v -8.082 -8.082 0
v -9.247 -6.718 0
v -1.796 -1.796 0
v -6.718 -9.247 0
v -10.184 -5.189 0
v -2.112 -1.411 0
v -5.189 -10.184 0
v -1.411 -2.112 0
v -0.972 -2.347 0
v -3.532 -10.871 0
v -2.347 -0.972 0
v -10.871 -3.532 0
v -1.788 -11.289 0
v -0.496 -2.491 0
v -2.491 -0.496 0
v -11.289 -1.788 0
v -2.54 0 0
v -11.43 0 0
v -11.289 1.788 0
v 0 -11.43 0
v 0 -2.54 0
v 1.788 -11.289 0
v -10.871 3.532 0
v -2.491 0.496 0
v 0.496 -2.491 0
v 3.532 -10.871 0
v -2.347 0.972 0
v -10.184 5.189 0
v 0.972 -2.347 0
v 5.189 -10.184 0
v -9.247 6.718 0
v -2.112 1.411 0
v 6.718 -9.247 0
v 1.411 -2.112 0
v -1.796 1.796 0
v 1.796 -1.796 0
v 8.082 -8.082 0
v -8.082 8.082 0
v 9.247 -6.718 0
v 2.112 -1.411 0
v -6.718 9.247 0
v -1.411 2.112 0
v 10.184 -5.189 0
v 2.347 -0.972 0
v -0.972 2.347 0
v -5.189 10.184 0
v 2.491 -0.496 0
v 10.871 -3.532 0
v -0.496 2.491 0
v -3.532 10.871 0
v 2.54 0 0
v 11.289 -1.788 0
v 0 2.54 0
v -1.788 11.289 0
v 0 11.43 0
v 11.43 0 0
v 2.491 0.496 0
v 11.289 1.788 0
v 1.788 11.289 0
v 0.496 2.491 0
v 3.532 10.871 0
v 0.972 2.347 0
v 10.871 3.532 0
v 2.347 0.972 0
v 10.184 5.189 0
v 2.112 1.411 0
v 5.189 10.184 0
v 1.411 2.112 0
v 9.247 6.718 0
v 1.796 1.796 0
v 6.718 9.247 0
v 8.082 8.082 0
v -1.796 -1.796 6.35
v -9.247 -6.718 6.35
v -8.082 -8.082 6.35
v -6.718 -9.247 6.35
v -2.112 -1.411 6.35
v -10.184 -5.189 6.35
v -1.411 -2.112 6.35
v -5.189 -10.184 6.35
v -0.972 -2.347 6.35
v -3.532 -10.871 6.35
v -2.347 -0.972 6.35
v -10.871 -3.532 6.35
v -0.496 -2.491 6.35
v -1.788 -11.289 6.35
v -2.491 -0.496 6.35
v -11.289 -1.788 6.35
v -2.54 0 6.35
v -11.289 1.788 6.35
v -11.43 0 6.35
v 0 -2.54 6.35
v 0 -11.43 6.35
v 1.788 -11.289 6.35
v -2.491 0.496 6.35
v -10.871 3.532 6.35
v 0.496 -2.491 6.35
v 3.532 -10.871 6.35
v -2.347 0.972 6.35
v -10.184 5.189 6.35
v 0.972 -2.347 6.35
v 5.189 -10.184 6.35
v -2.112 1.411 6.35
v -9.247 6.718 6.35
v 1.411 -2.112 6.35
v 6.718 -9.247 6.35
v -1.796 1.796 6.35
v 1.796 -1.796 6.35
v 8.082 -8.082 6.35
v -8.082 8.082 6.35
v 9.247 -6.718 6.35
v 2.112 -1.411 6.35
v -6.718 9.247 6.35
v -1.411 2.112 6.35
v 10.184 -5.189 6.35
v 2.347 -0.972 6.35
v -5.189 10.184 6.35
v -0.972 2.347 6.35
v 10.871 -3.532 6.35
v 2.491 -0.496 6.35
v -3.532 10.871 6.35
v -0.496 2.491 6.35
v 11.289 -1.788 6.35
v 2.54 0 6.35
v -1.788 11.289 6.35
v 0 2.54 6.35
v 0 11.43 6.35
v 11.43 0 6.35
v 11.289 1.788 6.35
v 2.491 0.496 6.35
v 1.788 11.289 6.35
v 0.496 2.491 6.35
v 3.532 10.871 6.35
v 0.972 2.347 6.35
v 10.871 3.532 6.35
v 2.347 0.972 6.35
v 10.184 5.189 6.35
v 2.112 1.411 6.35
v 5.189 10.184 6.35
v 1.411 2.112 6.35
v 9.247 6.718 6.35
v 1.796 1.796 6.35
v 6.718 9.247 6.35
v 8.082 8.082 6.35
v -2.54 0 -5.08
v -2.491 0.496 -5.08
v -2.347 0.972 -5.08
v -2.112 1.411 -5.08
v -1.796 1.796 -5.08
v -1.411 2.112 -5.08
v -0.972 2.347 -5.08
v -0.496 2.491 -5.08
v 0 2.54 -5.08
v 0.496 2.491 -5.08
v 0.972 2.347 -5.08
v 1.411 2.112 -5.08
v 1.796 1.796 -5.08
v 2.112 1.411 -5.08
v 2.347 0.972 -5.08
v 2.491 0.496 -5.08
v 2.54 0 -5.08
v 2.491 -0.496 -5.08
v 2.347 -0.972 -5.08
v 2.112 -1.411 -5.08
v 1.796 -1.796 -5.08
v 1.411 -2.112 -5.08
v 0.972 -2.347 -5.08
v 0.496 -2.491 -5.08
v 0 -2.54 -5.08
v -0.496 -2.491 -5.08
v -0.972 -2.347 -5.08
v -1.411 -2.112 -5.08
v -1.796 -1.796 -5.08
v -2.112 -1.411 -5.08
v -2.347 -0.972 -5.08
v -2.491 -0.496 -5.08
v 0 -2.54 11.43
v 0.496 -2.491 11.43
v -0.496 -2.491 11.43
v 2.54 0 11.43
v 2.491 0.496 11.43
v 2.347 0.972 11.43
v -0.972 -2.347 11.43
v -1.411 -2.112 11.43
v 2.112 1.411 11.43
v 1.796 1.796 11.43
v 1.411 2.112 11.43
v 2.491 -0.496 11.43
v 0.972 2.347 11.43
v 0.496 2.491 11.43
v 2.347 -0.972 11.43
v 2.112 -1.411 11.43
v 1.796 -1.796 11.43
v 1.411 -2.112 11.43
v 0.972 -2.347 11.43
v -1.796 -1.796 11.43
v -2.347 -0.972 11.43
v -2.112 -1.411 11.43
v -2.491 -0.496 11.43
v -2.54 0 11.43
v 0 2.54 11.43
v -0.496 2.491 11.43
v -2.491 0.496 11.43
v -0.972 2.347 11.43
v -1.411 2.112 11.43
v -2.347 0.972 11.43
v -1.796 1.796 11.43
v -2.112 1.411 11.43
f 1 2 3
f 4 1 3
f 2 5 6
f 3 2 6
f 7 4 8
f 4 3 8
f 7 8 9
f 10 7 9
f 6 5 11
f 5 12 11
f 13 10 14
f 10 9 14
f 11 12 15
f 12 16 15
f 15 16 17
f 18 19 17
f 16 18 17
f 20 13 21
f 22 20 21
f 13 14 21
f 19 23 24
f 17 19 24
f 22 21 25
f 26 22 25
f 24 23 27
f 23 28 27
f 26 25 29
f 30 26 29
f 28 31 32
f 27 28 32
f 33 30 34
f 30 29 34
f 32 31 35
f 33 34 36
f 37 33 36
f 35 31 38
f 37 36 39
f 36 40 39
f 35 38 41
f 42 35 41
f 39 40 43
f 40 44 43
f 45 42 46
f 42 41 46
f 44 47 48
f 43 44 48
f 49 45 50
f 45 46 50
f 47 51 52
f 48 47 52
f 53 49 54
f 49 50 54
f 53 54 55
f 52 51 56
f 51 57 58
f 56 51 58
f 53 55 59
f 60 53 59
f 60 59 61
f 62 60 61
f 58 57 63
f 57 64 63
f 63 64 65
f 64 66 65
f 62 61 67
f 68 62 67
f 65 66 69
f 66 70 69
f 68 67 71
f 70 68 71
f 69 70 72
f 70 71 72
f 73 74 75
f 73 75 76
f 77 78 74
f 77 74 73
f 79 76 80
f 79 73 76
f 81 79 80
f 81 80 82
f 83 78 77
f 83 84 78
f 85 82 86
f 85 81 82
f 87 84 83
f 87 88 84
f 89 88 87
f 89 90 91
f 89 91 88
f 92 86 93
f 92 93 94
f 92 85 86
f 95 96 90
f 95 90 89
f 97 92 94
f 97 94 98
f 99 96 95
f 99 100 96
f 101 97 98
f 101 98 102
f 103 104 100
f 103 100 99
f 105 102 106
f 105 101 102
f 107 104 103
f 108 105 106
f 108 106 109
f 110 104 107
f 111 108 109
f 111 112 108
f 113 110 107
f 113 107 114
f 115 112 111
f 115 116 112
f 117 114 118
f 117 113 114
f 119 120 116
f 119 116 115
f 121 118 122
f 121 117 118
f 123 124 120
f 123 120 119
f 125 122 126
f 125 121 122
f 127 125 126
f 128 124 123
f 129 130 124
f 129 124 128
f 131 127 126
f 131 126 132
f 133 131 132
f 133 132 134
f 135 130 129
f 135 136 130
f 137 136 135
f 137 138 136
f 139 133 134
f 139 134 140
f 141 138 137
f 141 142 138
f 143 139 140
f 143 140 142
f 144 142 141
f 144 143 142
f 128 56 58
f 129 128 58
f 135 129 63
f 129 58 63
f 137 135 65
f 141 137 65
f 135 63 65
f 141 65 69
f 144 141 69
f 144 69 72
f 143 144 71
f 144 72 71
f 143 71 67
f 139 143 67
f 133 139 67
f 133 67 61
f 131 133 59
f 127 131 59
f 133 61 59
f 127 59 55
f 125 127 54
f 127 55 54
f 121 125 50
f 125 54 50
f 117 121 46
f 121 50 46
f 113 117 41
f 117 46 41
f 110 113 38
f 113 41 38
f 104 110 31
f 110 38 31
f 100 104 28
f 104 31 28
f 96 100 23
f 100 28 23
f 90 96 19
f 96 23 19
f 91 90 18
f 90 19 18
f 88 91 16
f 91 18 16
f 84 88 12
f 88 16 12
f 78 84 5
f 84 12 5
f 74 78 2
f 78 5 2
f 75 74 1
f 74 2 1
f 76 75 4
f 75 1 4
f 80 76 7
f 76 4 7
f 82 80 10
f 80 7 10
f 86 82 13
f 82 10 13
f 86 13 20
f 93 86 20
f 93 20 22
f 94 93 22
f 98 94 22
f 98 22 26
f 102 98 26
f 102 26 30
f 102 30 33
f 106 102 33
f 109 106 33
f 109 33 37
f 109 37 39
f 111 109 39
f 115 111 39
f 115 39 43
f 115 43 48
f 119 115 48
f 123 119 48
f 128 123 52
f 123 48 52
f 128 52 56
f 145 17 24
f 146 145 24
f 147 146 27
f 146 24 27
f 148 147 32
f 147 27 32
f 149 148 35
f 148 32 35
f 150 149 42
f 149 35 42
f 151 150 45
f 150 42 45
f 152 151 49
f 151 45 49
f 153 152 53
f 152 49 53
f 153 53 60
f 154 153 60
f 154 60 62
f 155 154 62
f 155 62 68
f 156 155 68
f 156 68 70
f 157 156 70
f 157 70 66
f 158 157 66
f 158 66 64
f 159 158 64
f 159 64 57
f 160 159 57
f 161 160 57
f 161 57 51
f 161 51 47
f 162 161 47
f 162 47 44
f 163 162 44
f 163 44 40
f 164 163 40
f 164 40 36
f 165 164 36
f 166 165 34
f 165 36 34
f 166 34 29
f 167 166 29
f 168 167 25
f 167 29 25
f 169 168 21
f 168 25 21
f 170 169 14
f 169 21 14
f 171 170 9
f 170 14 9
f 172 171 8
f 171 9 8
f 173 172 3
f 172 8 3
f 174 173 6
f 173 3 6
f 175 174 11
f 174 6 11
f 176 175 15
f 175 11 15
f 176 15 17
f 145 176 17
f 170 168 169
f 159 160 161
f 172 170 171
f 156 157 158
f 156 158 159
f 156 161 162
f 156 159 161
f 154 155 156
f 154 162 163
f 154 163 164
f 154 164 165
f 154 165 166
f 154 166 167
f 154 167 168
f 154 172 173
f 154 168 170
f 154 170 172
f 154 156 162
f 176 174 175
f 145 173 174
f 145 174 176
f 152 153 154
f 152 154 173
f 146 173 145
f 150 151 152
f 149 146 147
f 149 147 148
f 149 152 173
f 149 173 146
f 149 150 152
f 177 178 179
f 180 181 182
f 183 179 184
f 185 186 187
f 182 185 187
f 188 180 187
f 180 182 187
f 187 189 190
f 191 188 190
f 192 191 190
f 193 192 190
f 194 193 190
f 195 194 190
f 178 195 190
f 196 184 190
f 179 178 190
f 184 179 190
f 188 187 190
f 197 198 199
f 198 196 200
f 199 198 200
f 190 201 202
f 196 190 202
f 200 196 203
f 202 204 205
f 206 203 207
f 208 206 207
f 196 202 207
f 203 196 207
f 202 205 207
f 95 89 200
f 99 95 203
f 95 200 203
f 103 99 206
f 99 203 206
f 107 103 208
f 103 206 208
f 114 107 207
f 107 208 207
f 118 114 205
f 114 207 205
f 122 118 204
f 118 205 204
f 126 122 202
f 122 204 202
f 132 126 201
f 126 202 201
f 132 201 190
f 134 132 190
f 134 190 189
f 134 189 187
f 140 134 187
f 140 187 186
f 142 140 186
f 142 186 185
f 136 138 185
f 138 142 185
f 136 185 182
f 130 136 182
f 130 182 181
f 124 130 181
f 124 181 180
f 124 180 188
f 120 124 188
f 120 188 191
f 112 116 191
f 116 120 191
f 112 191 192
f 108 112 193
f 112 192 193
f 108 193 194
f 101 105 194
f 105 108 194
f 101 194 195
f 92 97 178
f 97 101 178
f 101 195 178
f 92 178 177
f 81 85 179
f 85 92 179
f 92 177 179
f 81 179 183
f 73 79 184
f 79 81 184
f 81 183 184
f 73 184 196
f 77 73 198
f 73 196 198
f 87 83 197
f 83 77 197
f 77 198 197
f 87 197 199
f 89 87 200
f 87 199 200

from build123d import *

# Parameters (mm, degrees)
SKETCH1_R          = 11.43
MAIN_BODY_DEPTH    = 6.35
NIBBLES_DEPTH      = 5.08
NIBBLES_DEPTH_BACK = 11.43
SKETCH13_R         = 2.54


with BuildPart() as part:
    # Sketch1 → main body (new body)
    with BuildSketch(Plane.XY):
        Circle(SKETCH1_R)
    extrude(amount=MAIN_BODY_DEPTH)

    # Sketch13 → nibbles (add, two sides: drawn at the far end of the back side and taken through both)
    with BuildSketch(Plane(origin=(0, 0, 0), x_dir=(-1, 0, 0), z_dir=(0, 0, -1)).offset(-NIBBLES_DEPTH_BACK)):
        Circle(SKETCH13_R)
    extrude(amount=NIBBLES_DEPTH + NIBBLES_DEPTH_BACK)


solid = part.part
